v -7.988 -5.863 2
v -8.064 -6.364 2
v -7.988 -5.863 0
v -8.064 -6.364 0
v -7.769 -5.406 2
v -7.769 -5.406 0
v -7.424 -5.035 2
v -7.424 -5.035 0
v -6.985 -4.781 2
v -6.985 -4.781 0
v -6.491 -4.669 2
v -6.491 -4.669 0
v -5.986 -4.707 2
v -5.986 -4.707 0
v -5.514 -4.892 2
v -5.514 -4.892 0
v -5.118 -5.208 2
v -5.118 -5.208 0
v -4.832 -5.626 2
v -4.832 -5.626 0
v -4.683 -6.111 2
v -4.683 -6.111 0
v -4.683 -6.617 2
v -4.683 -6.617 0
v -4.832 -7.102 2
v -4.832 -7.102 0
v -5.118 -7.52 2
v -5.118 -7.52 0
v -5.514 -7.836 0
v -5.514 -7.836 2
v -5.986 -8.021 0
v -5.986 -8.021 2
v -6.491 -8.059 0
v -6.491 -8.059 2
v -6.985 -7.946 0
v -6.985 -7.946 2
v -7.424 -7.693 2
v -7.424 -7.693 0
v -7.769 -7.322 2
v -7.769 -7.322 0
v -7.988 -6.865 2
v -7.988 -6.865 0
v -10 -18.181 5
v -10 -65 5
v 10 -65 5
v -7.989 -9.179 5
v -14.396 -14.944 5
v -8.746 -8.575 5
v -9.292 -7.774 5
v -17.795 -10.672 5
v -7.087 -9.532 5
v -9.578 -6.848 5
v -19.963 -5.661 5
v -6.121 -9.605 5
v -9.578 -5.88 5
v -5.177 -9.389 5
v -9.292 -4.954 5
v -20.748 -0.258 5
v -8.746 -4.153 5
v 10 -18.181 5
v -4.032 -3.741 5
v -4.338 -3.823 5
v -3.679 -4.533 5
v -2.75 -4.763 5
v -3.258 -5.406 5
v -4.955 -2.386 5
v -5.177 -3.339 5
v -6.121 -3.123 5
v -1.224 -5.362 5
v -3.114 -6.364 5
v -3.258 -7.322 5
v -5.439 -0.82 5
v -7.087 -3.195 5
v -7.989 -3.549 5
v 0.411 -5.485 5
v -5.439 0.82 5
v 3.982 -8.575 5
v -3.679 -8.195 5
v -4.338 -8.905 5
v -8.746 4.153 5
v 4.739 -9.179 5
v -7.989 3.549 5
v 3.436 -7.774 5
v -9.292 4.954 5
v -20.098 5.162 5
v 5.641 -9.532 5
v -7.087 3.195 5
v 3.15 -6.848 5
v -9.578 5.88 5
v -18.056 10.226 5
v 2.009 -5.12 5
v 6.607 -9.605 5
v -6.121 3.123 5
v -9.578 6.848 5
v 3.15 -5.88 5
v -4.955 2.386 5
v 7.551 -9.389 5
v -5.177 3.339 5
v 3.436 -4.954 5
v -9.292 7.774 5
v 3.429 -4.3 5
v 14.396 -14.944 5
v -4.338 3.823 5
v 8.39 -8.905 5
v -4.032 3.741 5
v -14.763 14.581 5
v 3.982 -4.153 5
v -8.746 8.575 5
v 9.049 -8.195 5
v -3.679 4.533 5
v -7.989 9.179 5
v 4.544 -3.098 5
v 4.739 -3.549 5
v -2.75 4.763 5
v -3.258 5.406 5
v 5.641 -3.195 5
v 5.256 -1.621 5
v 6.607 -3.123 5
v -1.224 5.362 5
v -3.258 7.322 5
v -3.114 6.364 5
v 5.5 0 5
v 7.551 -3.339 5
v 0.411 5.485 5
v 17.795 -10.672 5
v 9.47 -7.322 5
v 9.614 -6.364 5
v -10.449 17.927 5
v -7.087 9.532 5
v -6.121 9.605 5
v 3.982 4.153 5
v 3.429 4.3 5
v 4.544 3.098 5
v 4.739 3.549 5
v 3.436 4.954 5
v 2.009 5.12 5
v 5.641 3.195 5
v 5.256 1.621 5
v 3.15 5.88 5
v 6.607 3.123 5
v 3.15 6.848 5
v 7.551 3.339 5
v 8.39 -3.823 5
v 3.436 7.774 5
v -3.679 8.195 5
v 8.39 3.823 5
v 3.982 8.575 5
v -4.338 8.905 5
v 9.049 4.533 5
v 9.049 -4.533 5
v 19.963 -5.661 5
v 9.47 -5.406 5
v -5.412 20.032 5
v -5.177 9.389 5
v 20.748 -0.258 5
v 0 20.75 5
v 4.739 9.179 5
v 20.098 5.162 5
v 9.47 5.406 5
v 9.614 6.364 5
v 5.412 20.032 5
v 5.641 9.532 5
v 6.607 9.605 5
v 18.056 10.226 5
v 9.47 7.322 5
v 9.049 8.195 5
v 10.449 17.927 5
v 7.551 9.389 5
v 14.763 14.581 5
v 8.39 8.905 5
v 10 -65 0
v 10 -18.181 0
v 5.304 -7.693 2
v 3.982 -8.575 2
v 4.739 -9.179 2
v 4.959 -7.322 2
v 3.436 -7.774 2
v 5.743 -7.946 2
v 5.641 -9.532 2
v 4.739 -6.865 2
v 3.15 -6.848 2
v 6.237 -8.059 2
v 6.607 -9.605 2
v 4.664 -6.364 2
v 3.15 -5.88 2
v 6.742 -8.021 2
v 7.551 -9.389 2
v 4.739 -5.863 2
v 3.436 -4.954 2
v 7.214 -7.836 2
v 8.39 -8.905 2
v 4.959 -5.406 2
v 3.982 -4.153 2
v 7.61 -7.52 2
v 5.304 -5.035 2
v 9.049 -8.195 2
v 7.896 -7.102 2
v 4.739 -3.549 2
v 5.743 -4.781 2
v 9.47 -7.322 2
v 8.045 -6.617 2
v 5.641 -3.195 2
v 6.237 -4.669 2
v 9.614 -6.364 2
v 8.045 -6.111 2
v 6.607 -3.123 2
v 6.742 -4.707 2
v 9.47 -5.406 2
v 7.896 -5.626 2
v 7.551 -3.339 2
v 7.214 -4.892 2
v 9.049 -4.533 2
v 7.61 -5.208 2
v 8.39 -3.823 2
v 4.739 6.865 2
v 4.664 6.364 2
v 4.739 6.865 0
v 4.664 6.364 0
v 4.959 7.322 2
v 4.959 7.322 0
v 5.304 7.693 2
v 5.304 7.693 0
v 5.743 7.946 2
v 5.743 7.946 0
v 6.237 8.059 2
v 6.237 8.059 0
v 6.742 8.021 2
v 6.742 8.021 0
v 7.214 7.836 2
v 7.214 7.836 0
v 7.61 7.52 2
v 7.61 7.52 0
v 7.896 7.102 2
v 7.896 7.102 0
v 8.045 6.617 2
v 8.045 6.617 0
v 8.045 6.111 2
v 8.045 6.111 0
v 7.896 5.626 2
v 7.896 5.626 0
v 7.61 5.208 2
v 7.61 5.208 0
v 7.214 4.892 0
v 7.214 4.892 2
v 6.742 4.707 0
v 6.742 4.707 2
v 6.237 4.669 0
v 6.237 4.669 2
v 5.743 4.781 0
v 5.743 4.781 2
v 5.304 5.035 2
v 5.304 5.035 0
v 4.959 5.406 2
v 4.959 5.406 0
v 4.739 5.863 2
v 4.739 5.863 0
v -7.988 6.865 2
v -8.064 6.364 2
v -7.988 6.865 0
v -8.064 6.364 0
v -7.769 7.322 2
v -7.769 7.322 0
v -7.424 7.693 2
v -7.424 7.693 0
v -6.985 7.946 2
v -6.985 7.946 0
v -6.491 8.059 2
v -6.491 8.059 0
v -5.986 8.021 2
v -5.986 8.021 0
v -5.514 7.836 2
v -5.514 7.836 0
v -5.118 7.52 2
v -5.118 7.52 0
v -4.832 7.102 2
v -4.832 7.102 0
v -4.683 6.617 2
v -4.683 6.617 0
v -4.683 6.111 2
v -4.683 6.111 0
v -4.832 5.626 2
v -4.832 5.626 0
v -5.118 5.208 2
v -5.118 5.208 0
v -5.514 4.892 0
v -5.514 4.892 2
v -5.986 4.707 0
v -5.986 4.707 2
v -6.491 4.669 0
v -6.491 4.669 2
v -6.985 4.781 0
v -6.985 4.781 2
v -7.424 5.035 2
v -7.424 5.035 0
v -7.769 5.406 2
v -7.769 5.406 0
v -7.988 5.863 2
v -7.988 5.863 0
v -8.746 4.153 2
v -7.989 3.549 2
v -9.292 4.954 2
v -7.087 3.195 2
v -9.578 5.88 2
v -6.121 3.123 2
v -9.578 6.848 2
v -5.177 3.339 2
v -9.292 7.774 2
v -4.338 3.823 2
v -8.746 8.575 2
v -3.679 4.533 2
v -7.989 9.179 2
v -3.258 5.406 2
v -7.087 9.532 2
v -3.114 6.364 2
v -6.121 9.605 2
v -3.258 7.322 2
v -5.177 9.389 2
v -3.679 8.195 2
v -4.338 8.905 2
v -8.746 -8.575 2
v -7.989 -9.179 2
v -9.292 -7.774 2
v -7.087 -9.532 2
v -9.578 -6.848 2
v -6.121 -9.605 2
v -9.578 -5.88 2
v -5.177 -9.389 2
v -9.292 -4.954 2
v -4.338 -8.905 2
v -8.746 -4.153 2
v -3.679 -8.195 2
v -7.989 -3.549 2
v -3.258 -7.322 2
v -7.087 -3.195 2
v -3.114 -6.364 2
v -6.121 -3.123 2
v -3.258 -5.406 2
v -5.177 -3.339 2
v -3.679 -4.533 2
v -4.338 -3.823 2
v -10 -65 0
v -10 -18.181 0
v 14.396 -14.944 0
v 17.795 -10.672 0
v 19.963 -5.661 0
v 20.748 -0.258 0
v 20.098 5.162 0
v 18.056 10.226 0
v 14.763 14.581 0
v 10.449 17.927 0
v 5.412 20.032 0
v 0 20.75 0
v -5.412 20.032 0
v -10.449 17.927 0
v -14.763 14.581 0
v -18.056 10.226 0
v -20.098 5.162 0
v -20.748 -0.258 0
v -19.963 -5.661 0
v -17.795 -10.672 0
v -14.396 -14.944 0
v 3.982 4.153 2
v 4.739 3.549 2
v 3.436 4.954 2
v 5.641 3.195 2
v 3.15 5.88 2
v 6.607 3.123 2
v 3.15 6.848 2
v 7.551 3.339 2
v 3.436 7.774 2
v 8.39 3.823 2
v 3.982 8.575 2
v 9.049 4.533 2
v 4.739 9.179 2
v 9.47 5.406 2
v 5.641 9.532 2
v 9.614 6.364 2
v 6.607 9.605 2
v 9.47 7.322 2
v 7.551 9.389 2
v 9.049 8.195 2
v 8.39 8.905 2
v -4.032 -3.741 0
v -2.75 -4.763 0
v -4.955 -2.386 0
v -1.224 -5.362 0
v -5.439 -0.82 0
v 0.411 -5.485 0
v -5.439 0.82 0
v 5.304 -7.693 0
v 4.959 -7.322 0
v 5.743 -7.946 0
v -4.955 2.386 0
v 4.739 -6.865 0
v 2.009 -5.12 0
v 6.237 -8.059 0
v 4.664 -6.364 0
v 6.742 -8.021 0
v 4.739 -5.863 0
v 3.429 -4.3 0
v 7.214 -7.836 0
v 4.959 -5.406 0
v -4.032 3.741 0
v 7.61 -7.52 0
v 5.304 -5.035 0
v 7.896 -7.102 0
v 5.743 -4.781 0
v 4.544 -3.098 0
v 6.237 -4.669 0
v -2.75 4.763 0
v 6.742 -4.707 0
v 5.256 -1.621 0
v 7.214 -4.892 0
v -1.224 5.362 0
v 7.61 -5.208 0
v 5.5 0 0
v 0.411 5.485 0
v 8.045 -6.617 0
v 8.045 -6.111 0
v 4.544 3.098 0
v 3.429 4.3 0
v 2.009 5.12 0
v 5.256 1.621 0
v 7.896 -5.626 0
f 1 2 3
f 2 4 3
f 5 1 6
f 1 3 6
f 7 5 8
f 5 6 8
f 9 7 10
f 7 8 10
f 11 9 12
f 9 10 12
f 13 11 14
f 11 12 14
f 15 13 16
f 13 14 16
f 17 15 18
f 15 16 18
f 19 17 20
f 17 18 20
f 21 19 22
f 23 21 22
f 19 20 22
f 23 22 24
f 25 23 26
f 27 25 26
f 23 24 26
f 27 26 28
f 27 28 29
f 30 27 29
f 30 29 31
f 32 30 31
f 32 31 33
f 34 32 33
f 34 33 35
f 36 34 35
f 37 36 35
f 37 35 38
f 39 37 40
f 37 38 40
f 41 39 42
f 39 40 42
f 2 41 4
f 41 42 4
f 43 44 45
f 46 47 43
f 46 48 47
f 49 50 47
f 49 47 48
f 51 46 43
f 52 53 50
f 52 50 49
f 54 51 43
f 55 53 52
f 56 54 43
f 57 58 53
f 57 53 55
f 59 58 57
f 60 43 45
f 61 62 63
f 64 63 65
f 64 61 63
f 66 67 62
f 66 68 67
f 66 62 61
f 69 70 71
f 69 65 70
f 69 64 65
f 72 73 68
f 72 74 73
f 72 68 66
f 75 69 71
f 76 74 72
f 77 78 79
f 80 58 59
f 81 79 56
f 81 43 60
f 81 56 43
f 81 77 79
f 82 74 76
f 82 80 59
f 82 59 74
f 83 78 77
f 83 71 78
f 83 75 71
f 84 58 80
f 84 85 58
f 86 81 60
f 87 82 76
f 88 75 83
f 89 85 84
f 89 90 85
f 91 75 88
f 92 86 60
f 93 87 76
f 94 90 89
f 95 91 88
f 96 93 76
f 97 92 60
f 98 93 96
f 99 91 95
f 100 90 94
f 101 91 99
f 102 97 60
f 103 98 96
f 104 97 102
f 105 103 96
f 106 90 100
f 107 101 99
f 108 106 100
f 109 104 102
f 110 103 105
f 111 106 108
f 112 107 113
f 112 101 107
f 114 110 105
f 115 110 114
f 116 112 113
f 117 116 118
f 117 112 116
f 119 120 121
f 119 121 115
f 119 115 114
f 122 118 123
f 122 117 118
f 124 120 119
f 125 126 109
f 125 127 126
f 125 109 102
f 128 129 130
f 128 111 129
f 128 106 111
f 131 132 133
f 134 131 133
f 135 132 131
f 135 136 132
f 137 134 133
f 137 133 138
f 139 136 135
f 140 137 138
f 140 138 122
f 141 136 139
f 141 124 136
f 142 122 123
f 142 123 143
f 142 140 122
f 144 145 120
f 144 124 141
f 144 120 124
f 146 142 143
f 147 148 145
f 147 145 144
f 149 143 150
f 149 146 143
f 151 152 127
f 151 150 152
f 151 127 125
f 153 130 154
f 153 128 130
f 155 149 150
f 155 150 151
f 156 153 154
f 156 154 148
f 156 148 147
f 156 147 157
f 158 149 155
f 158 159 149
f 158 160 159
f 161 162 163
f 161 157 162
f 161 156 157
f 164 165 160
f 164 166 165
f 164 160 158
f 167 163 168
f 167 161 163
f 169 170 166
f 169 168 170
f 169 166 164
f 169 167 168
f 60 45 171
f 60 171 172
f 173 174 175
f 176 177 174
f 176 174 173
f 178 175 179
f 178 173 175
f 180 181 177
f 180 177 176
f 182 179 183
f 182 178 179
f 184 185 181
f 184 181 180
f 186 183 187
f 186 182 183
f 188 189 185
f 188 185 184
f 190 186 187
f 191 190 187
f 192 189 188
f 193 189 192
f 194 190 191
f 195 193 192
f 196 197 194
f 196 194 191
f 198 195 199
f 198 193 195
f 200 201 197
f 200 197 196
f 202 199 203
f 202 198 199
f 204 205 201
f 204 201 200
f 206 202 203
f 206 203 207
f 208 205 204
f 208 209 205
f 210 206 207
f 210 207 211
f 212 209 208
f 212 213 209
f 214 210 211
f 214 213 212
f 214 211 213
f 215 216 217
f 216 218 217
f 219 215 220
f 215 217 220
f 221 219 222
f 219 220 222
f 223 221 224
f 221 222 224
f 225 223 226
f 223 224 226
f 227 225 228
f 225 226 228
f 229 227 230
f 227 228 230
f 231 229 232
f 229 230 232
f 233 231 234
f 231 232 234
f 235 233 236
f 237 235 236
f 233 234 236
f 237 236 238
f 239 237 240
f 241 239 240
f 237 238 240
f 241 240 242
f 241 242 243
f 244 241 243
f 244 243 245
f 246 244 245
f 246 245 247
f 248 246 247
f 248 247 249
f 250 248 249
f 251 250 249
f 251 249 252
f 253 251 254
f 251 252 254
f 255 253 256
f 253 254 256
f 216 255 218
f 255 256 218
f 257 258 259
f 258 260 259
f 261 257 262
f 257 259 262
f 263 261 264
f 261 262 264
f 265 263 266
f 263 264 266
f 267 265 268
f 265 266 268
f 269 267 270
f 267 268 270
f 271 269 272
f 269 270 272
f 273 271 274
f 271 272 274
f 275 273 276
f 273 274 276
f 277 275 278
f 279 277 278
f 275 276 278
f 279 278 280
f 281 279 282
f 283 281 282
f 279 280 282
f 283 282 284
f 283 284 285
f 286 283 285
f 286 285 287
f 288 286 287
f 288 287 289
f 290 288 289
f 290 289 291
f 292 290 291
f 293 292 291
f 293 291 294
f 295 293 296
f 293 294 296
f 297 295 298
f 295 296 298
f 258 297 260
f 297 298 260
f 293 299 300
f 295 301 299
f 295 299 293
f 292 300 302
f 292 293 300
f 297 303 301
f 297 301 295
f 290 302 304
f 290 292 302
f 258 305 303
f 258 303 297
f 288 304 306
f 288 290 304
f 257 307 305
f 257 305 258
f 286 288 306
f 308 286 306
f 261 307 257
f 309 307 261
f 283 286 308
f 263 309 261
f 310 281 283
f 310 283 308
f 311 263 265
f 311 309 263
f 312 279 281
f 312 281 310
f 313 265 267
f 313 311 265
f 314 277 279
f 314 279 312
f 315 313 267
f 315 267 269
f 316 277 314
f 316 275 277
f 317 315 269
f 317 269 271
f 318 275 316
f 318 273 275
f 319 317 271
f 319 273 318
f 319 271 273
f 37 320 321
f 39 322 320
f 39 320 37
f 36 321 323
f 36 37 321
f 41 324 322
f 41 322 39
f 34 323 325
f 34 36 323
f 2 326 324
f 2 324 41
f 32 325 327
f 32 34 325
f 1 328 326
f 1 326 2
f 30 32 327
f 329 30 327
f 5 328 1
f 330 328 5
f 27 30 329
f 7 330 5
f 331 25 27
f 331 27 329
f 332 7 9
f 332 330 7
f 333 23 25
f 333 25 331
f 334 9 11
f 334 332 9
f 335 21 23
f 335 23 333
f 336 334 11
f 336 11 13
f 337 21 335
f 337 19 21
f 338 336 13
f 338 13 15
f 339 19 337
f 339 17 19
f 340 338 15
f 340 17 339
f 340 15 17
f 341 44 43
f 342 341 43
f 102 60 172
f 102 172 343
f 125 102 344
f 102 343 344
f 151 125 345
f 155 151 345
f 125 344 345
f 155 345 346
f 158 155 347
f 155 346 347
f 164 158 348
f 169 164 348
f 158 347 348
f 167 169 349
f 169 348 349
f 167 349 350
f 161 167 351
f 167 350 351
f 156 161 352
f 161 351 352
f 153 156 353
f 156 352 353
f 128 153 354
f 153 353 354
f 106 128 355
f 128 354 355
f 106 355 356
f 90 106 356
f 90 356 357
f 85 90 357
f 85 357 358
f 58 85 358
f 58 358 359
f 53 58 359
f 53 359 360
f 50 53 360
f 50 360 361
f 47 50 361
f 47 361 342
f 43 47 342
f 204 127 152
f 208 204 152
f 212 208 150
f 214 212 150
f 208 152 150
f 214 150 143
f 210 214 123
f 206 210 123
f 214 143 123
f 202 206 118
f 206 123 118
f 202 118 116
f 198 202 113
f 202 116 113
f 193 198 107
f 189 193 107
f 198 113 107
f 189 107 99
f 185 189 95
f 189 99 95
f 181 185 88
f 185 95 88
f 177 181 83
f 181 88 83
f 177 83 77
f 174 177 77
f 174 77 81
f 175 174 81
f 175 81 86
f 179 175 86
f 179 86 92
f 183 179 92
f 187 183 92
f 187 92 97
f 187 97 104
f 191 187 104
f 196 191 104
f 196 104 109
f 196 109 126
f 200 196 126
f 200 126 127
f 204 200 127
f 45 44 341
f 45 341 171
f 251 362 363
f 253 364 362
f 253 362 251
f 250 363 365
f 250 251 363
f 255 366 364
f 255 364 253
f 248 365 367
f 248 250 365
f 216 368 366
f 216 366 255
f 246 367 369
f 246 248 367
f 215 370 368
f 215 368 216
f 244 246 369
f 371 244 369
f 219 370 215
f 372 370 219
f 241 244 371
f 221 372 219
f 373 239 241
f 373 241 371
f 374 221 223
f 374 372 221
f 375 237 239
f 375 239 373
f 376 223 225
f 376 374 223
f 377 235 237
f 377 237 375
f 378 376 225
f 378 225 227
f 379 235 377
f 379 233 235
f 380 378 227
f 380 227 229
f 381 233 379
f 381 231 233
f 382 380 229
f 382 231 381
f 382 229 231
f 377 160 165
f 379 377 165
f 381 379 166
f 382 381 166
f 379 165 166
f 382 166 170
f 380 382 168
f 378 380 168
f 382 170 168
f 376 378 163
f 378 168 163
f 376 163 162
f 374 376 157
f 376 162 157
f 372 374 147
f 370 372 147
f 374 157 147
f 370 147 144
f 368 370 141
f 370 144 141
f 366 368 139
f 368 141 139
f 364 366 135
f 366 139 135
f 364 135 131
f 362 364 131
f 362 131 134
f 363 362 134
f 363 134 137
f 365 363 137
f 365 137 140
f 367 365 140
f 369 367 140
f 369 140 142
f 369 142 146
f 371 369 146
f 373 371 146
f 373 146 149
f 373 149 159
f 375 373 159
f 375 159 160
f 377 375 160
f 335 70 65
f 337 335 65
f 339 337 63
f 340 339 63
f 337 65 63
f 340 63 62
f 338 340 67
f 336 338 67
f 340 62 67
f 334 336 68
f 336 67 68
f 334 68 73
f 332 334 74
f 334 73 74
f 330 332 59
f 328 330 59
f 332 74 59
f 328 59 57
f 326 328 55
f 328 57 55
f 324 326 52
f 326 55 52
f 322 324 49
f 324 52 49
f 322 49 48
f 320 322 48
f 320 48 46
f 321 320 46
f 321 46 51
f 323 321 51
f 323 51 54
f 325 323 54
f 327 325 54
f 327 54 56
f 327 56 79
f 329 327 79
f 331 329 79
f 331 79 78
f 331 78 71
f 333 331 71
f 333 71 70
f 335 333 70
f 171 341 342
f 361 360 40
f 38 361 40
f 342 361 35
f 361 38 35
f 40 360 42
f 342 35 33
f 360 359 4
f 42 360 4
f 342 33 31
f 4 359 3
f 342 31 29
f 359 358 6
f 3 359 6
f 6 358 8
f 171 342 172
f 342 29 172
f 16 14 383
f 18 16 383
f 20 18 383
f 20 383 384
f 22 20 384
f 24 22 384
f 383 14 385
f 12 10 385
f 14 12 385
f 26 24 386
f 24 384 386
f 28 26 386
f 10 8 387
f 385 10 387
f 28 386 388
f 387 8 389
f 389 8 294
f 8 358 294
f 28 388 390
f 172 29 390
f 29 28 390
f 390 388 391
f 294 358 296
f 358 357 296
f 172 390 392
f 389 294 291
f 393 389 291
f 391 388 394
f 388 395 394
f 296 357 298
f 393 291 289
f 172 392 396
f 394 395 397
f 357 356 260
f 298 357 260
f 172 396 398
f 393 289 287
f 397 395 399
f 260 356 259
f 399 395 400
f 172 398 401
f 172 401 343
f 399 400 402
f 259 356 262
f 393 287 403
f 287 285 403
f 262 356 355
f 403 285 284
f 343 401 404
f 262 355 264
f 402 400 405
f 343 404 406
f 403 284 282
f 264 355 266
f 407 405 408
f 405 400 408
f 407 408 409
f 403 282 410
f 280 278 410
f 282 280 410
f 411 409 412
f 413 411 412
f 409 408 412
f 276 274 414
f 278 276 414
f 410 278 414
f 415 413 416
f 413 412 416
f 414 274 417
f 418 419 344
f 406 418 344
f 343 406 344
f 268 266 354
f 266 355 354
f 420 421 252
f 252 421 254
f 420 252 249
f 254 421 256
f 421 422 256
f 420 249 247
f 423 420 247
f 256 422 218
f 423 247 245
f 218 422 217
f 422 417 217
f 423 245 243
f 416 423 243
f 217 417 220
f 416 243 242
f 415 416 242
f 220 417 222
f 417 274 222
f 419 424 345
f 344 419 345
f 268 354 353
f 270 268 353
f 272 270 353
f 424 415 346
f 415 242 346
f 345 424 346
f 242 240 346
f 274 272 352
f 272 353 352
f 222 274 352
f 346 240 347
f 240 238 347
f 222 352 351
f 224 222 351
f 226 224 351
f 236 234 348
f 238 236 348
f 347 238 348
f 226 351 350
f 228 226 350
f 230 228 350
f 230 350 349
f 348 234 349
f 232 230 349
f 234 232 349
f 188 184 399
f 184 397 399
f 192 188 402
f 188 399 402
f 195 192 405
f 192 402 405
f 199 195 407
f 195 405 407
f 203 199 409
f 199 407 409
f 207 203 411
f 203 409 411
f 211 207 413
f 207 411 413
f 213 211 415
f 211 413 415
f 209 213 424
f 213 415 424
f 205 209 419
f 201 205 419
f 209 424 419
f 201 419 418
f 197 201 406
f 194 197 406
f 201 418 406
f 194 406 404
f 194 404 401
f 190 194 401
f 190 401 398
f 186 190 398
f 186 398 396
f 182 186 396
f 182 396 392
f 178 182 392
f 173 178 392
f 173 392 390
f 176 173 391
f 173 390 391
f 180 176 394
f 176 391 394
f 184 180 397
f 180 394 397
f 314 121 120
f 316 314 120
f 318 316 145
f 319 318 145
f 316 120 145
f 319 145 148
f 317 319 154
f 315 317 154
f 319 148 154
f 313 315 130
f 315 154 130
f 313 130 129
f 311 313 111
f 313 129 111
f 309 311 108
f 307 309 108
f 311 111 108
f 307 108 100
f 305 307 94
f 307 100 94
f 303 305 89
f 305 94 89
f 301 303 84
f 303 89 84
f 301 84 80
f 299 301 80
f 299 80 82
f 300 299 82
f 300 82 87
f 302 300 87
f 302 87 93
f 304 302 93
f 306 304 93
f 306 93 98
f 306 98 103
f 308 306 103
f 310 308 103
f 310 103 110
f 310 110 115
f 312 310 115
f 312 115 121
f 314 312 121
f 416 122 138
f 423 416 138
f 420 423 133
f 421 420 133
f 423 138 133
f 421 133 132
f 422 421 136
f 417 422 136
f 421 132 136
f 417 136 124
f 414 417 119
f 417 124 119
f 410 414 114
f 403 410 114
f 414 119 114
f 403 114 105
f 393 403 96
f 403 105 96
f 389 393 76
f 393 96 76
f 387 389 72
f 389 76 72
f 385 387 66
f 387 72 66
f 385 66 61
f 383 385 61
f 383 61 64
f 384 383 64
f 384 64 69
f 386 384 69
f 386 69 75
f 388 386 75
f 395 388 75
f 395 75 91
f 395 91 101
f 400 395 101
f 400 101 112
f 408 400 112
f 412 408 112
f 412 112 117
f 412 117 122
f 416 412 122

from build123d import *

# Parameters (mm, degrees)
SKETCH_1_R                  = 20.75
EXTRUDE_1_DEPTH             = 5
HOLE_WIZARD_M31_D           = 3.4
HOLE_WIZARD_M31_CBORE_D     = 6.5
HOLE_WIZARD_M31_CBORE_DEPTH = 3
SKETCH_5_R                  = 5.5
CUT_EXTRUDE_1_DEPTH         = 30.767851787
SKETCH_6_W                  = 20
SKETCH_6_H                  = 50
EXTRUDE_2_DEPTH             = 5


with BuildPart() as part:
    # Эскиз1 → Бобышка-Вытянуть1 (new body)
    with BuildSketch(Plane.XY):
        Circle(SKETCH_1_R)
    extrude(amount=EXTRUDE_1_DEPTH)

    # Цековка для винта с внутренним шестигранником M31 (through all)
    with Locations(Plane.XY.offset(5)):
        with Locations((-6.363961031, 6.363961031), (6.363961031, 6.363961031), (6.363961031, -6.363961031), (-6.363961031, -6.363961031)):
            CounterBoreHole(HOLE_WIZARD_M31_D / 2, HOLE_WIZARD_M31_CBORE_D / 2, HOLE_WIZARD_M31_CBORE_DEPTH)

    # Эскиз5 → Вырез-Вытянуть1 (cut, through all)
    with BuildSketch(Plane.XY.offset(5)):
        Circle(SKETCH_5_R)
    extrude(amount=-CUT_EXTRUDE_1_DEPTH, mode=Mode.SUBTRACT)

    # Эскиз6 → Бобышка-Вытянуть2 (add)
    with BuildSketch(Plane.XY.offset(5)):
        with Locations((0, -40)):
            Rectangle(SKETCH_6_W, SKETCH_6_H)
    extrude(amount=-EXTRUDE_2_DEPTH)


solid = part.part
